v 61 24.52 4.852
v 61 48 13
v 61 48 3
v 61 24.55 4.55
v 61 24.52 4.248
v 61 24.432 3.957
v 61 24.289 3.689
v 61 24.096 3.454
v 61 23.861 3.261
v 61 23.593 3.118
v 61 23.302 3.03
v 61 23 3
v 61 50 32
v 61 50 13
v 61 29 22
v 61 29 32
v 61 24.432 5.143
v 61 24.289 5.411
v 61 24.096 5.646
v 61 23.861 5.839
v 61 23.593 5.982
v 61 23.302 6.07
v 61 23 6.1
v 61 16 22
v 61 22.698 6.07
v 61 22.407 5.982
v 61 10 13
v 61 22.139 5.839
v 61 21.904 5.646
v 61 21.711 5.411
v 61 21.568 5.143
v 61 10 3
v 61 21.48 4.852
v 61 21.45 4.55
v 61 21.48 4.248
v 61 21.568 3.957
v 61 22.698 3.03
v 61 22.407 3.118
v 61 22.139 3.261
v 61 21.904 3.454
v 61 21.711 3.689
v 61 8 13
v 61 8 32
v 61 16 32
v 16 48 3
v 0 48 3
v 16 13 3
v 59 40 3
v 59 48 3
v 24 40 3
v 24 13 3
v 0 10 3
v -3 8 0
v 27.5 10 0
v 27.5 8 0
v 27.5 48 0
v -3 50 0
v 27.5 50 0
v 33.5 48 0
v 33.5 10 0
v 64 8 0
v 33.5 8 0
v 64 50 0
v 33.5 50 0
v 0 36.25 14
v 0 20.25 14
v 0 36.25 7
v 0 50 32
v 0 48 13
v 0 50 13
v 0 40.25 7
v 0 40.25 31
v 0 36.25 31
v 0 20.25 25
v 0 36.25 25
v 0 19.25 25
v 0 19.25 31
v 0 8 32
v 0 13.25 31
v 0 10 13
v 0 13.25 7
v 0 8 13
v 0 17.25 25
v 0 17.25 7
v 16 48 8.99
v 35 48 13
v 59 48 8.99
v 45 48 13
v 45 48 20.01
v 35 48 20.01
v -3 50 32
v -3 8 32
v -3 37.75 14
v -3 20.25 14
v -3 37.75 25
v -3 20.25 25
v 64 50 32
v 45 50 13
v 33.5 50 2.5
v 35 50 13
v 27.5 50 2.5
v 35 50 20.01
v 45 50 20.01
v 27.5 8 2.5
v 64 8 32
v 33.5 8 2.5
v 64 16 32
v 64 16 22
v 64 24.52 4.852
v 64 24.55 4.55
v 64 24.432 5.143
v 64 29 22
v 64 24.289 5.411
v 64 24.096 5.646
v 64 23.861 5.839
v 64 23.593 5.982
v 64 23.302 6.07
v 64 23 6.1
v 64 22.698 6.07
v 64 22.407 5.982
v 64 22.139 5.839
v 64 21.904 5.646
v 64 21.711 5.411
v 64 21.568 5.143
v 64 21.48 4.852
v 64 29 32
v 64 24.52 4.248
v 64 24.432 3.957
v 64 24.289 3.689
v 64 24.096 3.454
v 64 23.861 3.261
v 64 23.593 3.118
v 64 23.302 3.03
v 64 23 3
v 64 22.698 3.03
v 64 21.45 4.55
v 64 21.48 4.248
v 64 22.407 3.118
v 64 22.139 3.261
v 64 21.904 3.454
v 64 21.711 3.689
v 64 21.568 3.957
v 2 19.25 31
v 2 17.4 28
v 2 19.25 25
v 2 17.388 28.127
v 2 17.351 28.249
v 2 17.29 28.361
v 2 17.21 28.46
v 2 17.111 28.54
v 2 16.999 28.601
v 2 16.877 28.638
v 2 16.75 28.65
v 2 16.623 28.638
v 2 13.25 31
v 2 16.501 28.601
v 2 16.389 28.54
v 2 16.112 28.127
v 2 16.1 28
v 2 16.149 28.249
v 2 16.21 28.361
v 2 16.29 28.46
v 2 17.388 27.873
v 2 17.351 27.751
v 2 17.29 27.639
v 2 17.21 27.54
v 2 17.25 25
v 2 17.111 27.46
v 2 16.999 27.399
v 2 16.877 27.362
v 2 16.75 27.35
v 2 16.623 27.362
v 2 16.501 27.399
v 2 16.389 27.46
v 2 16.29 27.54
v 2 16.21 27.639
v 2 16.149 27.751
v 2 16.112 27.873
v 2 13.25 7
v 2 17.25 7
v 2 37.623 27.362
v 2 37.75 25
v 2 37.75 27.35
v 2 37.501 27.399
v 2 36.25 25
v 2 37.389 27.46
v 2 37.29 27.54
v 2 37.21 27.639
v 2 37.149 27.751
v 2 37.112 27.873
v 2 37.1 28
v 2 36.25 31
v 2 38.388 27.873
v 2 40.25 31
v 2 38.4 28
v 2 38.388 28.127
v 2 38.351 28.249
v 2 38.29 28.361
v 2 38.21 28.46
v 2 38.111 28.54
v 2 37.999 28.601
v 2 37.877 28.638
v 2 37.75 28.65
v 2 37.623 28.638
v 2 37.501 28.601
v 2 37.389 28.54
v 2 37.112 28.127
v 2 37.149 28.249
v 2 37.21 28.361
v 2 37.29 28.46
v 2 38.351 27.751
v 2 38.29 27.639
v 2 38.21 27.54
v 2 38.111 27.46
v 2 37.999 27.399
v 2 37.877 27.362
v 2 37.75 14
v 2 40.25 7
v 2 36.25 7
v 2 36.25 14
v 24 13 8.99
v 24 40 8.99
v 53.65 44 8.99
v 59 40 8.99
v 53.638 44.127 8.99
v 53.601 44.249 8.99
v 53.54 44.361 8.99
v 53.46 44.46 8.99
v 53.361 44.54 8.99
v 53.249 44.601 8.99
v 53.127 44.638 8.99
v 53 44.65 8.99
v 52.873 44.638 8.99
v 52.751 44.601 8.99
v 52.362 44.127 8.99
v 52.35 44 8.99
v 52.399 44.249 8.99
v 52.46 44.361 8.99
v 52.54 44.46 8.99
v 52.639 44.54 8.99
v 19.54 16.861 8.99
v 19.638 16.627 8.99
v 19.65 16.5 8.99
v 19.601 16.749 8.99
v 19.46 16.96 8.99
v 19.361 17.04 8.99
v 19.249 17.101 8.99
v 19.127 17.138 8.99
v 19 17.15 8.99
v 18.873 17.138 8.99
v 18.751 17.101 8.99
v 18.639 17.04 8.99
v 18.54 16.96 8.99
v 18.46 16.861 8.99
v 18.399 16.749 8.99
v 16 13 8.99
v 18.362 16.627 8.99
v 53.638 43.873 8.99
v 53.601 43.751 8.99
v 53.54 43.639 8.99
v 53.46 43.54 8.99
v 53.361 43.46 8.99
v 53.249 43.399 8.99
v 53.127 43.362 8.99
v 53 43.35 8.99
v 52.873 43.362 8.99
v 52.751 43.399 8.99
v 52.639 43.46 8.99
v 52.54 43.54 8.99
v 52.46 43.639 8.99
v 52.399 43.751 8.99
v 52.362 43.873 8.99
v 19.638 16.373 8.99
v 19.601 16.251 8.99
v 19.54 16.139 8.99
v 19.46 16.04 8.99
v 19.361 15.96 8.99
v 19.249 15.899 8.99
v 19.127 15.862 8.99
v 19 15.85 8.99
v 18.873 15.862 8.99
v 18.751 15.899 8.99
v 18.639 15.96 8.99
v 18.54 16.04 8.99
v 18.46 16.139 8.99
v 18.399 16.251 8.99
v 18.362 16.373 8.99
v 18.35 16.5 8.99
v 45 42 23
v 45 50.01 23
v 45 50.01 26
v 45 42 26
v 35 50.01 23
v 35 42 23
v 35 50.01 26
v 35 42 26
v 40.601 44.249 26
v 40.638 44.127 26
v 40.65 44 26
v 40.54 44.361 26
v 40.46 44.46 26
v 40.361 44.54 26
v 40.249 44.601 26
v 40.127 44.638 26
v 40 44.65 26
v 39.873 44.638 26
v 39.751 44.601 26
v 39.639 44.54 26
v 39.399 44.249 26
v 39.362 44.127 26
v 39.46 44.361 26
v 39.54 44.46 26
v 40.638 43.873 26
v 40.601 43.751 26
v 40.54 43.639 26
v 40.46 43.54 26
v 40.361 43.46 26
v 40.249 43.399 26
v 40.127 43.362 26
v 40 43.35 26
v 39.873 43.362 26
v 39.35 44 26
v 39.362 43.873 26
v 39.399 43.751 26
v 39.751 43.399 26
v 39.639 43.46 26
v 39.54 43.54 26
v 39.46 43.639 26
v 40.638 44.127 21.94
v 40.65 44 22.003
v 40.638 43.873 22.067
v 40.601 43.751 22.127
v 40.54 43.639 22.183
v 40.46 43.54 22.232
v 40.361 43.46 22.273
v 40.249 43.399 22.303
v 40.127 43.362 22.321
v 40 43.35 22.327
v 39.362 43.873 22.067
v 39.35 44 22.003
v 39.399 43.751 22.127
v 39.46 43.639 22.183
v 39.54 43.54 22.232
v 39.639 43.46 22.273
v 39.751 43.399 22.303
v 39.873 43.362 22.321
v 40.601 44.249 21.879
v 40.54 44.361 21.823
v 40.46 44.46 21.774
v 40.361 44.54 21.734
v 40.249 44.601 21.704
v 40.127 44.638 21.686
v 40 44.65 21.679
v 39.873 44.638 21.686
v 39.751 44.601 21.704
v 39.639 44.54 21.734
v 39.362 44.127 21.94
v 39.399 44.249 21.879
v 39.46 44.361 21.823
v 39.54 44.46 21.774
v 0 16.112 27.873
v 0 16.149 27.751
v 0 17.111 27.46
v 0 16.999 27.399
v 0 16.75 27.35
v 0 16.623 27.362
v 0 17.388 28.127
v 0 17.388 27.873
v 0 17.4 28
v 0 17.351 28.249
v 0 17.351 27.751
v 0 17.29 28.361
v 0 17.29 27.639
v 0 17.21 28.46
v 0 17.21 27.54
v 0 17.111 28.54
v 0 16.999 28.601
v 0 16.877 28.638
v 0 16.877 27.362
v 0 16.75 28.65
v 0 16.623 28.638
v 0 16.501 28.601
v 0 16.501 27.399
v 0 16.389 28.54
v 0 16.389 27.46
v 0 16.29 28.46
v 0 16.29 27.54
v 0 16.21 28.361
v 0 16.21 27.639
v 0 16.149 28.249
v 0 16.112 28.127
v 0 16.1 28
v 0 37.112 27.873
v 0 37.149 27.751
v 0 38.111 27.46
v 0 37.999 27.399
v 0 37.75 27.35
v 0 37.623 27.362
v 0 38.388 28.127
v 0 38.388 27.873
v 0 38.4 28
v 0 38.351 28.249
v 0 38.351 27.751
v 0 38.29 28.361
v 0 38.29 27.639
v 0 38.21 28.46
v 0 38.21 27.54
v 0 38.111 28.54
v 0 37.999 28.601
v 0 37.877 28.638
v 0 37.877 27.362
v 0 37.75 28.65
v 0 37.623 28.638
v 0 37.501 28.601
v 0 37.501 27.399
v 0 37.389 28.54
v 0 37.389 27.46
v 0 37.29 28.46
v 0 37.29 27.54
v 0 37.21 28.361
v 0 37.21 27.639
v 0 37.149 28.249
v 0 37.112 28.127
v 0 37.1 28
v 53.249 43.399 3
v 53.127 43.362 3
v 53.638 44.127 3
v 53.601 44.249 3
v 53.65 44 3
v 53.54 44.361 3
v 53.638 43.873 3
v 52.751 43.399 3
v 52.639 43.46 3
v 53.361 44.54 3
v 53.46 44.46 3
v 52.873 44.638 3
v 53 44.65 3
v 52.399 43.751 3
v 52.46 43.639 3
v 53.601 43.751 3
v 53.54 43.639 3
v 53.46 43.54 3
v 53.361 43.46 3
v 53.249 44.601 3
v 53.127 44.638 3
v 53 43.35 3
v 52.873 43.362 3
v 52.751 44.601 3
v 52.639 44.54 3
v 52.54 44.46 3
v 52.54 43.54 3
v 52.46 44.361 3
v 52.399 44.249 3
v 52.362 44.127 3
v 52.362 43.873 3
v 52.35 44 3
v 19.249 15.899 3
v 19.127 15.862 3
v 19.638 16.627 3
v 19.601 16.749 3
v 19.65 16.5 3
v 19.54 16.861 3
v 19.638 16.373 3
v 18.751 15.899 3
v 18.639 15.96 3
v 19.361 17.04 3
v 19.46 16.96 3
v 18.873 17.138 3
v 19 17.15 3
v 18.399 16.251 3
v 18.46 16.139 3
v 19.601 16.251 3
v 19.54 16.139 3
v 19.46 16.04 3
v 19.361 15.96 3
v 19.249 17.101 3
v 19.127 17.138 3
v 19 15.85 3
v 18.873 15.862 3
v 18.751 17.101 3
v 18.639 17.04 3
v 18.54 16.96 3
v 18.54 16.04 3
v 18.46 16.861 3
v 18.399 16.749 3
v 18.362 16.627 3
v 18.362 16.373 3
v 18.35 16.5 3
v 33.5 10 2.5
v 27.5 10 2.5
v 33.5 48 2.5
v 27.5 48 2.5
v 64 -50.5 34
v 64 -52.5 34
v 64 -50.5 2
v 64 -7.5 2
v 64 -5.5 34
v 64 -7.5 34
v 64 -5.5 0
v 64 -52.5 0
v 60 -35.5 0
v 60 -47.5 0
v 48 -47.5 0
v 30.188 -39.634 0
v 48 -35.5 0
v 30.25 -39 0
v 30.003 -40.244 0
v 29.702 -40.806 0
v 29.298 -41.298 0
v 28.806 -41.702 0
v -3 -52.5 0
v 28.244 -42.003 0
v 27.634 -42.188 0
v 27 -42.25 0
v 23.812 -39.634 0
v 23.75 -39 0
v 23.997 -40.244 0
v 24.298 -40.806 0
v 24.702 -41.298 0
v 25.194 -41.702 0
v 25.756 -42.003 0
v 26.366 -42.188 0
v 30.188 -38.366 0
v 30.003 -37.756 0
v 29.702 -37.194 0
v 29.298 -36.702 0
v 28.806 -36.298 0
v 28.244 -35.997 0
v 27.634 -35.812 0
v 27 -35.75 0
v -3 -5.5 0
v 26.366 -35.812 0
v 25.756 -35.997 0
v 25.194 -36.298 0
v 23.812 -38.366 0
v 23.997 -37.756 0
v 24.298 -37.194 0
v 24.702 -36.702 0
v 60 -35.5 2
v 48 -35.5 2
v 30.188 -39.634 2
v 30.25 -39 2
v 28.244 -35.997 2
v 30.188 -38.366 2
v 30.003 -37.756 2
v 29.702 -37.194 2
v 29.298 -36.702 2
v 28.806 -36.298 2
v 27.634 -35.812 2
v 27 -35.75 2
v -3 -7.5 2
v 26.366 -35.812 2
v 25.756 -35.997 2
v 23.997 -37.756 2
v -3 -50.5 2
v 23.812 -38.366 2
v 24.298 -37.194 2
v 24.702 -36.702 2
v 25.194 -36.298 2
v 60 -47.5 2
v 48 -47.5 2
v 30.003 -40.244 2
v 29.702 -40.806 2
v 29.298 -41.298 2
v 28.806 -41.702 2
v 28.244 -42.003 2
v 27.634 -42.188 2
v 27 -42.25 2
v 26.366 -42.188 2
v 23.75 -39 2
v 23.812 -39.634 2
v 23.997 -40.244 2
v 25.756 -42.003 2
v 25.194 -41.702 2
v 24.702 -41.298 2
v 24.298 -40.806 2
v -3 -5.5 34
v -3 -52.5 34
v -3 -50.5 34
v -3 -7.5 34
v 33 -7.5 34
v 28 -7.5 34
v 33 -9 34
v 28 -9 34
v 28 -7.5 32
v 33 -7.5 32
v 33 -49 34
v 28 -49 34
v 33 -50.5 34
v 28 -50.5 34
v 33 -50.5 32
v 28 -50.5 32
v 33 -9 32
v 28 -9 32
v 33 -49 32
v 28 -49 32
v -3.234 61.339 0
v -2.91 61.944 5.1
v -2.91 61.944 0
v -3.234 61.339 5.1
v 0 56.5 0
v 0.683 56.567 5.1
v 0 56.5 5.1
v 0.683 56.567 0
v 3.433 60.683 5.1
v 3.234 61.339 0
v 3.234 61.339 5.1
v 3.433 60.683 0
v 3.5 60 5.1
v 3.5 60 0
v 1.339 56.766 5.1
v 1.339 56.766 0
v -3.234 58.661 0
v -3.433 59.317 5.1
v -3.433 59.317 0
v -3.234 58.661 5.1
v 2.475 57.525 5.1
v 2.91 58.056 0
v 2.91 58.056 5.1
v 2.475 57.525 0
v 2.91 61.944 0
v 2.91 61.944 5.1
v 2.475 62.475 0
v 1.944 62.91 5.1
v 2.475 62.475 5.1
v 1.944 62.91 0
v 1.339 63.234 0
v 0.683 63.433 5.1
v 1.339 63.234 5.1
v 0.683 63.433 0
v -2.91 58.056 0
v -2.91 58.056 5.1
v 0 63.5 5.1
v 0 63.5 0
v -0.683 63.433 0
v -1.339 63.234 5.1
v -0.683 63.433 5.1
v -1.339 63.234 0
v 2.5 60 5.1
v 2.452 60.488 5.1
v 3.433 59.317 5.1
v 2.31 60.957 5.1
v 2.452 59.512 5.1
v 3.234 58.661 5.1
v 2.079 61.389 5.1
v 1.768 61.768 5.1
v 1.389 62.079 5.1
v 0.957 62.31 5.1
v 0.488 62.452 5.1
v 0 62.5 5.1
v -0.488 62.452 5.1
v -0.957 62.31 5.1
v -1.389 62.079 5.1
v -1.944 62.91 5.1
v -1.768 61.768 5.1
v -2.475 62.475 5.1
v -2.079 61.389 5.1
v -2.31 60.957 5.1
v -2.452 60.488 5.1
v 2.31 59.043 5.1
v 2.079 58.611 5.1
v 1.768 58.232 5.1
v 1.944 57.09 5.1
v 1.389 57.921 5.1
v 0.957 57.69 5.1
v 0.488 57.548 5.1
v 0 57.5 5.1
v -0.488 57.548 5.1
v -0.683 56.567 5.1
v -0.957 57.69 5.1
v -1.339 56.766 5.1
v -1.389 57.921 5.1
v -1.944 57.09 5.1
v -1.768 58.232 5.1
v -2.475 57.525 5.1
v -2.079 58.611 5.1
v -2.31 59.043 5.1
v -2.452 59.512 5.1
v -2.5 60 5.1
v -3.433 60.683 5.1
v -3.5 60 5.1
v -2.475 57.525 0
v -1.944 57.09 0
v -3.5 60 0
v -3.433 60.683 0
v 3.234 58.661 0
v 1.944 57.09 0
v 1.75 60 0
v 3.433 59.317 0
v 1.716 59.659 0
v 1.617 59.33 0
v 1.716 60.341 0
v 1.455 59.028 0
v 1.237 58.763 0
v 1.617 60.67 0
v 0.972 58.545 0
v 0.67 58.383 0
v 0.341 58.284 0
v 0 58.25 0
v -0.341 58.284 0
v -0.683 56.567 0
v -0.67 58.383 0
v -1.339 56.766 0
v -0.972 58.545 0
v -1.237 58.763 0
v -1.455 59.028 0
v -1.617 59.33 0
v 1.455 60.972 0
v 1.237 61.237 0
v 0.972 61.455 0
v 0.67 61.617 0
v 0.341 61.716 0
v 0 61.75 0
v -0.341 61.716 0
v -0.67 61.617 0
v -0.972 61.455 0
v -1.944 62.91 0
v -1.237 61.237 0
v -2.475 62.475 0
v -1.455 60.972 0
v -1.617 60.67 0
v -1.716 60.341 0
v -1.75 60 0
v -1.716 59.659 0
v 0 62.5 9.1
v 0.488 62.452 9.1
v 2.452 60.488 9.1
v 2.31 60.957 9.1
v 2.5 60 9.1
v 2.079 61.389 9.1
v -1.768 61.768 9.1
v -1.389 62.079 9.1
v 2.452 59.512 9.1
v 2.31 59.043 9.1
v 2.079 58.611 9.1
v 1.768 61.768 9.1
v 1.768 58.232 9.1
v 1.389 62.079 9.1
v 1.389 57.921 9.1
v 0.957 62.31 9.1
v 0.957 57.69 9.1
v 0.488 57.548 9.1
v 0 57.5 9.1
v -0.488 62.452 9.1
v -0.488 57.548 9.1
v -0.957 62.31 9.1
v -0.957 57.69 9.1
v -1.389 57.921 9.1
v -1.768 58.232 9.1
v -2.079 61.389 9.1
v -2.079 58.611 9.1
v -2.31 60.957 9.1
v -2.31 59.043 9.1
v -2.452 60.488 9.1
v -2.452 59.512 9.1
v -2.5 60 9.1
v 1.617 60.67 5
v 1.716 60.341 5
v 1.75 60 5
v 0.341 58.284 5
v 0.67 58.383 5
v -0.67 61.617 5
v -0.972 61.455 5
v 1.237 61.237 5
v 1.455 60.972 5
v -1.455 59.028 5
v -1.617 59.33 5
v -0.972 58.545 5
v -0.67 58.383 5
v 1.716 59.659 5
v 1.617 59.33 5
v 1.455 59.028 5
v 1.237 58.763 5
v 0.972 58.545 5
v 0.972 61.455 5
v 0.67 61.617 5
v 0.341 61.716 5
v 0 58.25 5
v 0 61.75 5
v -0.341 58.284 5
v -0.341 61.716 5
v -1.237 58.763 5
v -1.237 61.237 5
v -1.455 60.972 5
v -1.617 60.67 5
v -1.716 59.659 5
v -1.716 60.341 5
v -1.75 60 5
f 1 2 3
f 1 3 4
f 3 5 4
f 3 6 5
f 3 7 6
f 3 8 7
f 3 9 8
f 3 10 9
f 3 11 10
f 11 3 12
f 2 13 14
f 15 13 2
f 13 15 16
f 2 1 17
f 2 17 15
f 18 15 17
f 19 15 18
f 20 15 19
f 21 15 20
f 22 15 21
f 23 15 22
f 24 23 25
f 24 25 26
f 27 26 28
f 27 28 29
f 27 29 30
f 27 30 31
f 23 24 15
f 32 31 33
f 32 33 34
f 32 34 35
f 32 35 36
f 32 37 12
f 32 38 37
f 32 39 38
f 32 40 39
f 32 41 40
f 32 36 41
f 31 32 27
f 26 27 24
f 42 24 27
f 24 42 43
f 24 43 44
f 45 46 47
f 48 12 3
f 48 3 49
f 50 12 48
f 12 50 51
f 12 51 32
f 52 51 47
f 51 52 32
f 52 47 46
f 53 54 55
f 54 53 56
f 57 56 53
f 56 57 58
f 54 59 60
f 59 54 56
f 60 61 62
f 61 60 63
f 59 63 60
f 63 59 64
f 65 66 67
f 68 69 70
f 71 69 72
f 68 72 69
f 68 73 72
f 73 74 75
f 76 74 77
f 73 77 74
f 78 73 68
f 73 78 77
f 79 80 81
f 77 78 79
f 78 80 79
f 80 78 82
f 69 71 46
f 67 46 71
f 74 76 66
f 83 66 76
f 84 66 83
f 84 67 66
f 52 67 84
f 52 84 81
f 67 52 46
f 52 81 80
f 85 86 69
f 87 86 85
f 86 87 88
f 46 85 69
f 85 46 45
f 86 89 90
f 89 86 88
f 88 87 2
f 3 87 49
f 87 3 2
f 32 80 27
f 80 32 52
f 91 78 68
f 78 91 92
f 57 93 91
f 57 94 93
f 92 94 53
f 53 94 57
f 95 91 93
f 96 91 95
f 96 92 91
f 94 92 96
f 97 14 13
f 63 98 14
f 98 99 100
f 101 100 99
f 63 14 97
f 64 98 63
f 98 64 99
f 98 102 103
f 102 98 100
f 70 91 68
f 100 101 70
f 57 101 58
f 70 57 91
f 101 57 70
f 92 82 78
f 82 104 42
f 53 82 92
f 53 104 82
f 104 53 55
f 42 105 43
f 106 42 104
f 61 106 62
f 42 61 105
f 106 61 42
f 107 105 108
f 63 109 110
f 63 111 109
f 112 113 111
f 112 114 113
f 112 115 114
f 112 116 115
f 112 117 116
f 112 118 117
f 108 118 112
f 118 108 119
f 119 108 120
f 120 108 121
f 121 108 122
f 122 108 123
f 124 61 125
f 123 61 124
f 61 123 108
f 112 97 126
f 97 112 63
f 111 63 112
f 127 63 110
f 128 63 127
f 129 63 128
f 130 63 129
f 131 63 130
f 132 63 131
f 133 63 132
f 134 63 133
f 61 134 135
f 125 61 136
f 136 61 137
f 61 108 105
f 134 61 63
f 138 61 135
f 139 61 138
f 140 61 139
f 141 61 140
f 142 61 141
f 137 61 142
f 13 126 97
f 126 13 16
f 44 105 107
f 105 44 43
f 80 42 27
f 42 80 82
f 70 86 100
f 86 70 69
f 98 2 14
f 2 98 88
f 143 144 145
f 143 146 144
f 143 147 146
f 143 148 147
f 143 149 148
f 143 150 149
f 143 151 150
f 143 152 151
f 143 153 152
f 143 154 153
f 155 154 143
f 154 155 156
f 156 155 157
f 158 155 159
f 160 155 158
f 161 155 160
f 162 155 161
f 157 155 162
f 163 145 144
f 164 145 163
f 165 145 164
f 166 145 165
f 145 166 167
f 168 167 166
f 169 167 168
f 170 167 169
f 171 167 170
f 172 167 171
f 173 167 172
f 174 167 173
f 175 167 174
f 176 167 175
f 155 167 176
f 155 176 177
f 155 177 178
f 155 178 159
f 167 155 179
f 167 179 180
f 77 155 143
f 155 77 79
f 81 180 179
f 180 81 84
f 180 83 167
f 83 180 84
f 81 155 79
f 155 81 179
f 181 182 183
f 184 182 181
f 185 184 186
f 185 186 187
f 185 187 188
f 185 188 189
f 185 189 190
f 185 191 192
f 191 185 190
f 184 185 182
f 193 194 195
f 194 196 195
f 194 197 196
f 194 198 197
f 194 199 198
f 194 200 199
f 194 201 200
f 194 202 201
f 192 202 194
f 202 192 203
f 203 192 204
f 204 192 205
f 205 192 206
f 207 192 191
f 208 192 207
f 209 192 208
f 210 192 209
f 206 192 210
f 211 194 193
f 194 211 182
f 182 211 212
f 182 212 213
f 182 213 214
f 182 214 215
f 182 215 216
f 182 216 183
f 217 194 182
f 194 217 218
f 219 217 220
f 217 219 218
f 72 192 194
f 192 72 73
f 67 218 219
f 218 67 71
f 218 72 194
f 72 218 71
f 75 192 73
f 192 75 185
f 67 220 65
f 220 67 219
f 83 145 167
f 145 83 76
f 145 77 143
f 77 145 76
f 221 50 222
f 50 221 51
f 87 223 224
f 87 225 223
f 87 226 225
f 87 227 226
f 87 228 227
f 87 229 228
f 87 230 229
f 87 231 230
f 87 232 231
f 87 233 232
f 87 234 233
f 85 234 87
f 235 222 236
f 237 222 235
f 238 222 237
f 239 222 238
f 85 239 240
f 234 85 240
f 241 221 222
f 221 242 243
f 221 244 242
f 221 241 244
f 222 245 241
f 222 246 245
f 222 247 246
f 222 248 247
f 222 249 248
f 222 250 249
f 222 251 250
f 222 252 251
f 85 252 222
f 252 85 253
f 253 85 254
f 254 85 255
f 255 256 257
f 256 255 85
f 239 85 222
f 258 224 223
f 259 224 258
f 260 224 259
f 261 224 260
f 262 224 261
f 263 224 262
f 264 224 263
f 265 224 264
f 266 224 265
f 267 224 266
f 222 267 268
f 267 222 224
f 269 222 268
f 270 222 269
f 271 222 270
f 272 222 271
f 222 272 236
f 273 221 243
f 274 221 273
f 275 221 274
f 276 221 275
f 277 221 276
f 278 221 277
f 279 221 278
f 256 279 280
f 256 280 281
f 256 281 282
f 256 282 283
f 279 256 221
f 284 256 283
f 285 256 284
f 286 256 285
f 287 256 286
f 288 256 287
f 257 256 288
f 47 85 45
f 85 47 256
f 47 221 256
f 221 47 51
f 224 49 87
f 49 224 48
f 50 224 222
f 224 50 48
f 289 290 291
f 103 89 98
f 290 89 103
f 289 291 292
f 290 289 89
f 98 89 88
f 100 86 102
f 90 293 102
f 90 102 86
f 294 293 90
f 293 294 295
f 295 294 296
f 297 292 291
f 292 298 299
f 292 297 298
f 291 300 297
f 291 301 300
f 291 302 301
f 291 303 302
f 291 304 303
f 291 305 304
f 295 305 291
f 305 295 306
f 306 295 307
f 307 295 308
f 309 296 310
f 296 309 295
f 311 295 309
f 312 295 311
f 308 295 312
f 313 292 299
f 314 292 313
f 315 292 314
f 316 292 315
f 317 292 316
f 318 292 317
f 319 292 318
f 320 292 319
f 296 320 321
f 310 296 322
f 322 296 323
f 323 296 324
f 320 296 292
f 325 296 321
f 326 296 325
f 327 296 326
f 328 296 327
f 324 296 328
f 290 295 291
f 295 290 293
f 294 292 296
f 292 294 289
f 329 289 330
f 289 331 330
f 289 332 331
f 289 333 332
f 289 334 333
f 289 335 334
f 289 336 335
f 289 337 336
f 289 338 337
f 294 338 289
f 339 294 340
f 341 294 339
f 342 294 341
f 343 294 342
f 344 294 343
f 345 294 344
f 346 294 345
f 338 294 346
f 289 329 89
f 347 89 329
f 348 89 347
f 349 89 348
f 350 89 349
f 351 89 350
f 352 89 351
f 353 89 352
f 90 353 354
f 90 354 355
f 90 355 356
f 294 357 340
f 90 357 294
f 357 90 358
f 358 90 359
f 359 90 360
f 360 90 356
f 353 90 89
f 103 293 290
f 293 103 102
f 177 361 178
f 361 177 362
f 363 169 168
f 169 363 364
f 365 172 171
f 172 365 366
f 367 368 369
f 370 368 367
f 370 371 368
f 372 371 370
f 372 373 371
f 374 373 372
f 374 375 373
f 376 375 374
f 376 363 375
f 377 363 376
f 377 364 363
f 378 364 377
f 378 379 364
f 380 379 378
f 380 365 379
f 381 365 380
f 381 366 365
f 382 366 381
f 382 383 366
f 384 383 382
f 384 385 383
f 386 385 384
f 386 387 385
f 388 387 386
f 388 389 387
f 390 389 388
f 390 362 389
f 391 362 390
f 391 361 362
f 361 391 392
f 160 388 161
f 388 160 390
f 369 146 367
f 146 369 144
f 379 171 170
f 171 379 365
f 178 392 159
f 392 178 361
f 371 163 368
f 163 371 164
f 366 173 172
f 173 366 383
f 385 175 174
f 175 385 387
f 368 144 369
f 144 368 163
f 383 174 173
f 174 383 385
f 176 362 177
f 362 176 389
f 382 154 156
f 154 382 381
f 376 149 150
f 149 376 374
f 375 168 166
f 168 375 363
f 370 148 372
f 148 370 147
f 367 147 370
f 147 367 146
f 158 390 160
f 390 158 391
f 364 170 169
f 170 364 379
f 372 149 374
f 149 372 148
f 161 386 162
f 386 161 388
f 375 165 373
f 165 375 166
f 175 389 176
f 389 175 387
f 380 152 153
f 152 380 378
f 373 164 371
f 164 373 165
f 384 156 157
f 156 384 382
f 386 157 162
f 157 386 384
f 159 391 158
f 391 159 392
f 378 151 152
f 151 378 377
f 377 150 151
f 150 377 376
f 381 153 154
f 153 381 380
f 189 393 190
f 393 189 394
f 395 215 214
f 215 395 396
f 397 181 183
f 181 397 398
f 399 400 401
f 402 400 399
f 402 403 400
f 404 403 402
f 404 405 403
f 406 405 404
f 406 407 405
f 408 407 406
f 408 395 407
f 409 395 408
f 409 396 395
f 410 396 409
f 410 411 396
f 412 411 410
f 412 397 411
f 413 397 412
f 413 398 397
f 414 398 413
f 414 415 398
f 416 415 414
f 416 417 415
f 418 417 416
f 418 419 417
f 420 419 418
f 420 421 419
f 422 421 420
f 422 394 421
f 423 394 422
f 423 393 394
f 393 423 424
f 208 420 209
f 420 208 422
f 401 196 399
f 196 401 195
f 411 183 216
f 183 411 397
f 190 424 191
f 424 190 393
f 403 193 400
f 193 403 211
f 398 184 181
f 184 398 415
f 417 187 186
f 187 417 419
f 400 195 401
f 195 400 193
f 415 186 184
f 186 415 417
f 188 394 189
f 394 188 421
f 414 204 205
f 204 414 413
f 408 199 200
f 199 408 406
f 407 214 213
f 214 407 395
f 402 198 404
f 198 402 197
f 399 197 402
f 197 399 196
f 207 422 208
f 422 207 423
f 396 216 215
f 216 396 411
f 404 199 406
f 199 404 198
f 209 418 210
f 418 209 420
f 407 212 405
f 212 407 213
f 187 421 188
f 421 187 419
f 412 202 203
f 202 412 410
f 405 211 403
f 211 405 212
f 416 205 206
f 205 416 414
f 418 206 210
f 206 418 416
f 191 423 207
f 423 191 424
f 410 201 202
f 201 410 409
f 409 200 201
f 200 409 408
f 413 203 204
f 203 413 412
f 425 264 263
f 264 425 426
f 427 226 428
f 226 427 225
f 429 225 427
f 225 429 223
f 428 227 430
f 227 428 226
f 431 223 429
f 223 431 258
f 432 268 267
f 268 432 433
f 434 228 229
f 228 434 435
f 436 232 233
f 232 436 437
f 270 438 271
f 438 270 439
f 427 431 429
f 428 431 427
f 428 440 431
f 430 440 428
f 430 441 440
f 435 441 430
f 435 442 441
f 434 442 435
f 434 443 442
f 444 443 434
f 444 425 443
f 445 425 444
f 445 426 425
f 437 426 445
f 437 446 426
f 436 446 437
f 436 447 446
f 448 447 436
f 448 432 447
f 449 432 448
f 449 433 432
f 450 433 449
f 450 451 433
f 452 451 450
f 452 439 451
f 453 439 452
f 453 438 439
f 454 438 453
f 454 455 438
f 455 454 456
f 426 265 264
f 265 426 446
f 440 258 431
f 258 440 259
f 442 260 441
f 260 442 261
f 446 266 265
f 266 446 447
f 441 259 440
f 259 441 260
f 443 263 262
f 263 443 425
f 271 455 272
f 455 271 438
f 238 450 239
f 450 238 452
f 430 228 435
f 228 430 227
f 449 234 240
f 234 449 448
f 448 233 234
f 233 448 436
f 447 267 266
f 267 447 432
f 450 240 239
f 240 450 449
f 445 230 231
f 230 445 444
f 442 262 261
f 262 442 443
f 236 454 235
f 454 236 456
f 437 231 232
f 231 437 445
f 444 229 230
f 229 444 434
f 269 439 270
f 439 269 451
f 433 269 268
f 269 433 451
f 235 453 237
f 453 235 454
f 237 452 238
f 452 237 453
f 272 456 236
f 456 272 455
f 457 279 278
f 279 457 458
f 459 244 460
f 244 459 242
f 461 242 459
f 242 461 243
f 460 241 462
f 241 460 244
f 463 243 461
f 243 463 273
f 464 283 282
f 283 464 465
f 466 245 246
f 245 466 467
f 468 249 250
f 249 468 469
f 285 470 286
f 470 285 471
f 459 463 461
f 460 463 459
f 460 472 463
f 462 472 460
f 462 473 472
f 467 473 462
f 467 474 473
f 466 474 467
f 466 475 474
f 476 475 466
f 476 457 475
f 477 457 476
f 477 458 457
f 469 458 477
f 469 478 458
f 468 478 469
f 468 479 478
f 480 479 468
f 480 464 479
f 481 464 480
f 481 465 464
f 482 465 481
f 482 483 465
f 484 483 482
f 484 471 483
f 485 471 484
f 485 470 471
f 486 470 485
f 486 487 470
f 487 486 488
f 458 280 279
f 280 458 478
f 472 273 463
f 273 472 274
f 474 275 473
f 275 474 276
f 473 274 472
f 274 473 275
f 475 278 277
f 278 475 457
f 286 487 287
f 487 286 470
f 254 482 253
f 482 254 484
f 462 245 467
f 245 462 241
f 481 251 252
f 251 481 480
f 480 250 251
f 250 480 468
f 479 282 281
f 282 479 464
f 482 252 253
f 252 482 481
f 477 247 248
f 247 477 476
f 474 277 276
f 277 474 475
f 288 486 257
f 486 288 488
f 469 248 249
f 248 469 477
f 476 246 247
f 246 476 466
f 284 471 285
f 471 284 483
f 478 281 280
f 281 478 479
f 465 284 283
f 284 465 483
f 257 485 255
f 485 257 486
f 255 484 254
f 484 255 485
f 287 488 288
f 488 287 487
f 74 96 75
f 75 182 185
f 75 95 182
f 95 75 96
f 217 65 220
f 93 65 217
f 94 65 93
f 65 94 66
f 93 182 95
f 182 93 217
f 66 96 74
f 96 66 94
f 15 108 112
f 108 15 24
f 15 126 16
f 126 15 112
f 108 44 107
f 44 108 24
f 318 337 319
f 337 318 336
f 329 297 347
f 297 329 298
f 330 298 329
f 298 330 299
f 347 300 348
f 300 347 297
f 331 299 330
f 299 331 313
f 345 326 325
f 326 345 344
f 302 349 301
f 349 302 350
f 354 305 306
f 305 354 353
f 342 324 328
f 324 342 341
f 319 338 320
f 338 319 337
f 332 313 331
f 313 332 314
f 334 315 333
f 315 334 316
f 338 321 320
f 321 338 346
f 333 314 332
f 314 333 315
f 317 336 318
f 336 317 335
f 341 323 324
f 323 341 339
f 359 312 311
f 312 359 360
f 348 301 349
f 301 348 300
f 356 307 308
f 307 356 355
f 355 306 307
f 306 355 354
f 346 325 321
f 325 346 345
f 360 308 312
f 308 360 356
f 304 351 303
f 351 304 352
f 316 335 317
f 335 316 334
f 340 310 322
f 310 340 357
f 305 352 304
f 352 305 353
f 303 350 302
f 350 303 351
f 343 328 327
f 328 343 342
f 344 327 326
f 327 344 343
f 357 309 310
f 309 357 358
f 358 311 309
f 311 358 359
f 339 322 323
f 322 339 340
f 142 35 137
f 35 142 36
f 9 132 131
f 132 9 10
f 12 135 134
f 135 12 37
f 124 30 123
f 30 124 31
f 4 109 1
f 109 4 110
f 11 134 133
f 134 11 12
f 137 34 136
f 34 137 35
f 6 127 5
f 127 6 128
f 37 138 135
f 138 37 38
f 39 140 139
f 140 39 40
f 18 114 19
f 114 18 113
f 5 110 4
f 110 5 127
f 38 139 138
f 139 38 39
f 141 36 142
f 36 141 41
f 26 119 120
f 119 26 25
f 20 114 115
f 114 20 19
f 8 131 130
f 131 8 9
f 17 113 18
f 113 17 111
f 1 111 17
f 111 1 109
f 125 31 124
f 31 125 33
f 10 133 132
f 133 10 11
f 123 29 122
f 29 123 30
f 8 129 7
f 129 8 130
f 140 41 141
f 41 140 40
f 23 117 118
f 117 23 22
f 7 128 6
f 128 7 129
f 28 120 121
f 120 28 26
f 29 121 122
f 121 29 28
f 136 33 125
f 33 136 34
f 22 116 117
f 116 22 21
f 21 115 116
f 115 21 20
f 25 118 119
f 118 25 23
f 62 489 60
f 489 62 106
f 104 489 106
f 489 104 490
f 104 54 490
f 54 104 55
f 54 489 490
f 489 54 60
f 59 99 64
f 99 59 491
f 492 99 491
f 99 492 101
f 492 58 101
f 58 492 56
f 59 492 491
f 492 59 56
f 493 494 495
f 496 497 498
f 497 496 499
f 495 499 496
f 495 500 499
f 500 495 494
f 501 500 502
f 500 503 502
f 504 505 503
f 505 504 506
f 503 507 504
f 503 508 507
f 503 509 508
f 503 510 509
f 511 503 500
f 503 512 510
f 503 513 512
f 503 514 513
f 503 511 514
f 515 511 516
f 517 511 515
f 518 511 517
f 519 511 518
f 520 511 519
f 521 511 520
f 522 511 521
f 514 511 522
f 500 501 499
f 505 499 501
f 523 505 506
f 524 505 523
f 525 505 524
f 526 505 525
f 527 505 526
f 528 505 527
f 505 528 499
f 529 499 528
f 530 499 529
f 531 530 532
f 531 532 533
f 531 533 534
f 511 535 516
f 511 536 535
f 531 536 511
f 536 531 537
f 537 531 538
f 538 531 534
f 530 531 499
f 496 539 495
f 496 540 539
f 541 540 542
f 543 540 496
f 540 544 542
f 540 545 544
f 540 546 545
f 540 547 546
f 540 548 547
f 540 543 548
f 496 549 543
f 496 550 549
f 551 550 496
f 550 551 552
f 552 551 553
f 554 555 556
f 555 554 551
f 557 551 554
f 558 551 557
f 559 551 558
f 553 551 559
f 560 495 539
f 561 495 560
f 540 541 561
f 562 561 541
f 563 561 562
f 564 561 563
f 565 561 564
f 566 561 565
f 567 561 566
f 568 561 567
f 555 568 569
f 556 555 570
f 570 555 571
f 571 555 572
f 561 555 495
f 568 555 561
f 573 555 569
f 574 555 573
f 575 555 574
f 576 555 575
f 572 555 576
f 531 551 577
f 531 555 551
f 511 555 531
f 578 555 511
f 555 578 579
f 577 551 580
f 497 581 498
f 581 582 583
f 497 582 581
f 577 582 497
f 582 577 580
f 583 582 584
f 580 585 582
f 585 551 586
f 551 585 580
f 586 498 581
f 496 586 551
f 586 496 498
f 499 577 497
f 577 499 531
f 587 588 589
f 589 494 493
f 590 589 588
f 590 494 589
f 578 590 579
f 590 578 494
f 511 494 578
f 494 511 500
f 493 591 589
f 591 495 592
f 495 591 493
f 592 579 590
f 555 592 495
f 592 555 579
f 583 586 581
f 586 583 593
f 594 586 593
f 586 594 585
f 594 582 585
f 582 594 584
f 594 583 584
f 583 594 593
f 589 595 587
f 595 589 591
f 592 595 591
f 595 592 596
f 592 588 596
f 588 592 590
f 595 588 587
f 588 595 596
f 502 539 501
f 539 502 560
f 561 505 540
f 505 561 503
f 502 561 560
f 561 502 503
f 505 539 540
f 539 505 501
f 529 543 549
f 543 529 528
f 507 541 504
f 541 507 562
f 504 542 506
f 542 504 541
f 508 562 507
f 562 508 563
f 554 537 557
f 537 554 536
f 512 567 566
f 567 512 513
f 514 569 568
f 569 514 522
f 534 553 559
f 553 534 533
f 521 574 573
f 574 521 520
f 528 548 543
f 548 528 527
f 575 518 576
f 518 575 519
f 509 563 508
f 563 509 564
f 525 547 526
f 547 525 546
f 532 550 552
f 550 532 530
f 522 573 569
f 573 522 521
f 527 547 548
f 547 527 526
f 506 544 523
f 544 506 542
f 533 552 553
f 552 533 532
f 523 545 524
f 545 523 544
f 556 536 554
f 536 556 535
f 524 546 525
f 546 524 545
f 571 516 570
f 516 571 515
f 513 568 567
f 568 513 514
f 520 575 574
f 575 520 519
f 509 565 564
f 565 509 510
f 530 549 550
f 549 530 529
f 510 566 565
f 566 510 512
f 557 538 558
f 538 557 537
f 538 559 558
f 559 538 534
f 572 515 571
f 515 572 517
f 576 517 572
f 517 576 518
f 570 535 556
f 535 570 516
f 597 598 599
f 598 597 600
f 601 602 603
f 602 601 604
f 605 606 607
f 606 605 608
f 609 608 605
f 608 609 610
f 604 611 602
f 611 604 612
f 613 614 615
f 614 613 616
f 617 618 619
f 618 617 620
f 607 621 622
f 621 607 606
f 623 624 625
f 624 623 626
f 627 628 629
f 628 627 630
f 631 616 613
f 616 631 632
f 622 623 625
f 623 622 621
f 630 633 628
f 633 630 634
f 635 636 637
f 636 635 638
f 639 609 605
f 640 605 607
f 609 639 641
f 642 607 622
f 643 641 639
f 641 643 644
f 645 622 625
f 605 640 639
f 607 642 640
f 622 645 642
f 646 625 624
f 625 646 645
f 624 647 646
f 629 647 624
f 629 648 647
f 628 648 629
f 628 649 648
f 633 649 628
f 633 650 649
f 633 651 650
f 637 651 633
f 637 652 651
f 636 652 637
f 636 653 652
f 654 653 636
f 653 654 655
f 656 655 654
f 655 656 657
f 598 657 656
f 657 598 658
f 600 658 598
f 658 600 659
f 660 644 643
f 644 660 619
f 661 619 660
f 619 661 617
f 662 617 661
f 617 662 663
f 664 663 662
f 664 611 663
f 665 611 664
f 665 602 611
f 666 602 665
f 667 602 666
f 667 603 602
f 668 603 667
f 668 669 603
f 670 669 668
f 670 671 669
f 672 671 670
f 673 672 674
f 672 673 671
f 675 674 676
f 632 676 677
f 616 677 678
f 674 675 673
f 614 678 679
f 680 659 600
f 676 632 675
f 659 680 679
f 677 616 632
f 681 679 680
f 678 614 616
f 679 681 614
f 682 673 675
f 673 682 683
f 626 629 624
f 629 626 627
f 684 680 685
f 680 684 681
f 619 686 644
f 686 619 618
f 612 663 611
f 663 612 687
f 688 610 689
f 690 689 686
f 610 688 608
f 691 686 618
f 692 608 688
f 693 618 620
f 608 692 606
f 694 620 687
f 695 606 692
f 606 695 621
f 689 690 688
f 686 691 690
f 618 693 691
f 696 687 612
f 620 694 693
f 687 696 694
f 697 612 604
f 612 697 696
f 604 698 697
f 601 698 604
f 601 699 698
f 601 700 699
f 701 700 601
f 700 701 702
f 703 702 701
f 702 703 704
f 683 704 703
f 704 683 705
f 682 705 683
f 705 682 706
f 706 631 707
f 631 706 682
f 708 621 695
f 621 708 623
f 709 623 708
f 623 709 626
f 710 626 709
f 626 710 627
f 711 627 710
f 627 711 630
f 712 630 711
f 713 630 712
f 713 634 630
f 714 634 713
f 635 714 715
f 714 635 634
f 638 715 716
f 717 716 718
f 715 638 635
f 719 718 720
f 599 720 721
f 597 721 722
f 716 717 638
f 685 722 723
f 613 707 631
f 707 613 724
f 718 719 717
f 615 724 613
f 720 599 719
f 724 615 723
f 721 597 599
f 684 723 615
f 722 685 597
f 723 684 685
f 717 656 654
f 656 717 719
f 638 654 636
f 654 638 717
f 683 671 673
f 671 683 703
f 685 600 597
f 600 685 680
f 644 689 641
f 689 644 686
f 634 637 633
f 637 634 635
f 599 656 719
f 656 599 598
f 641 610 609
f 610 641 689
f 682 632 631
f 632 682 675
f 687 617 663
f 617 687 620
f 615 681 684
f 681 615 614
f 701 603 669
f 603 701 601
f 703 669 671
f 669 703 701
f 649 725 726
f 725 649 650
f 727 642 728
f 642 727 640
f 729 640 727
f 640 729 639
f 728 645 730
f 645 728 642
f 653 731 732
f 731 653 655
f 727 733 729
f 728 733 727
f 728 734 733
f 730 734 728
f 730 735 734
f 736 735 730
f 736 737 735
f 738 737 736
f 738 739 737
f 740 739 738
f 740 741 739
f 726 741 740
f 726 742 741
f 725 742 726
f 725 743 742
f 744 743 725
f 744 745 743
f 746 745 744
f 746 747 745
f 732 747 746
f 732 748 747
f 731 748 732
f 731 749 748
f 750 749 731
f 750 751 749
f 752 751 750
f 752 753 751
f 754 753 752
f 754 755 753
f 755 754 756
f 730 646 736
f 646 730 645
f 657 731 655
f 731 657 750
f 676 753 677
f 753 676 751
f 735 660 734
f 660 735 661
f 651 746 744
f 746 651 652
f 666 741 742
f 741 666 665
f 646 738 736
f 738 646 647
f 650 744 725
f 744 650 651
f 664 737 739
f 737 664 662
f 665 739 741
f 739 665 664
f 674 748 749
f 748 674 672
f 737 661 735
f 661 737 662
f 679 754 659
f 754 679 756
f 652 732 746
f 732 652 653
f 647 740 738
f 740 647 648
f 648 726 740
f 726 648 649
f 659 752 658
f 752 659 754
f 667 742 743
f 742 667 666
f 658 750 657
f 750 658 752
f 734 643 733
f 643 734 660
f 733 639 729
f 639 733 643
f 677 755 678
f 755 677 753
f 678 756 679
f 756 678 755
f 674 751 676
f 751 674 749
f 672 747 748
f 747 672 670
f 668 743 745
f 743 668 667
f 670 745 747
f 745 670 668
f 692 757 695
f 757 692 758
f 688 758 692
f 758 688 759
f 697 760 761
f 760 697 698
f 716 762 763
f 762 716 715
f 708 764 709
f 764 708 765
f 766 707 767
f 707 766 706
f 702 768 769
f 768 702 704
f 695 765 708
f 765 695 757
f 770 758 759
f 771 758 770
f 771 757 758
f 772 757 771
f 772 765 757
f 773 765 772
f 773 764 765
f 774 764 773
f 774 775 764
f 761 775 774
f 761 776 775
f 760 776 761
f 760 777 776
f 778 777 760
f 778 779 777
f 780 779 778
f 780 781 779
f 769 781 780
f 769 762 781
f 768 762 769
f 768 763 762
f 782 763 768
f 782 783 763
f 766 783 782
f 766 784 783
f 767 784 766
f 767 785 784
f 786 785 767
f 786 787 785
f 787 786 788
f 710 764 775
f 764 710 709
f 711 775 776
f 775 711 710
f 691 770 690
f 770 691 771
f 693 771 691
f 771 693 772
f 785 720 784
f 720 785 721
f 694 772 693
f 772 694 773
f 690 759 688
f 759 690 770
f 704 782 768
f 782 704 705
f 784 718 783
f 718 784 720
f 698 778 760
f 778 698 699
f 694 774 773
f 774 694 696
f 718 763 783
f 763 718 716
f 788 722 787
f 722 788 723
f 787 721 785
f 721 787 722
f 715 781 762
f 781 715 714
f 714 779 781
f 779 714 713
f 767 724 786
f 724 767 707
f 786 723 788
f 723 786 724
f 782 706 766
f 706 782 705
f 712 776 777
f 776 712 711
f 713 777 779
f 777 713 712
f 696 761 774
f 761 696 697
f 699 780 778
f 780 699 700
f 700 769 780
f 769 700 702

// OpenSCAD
/*
* Open3DOLED is licensed under CC BY-NC-SA 4.0. To view a copy of this license, visit http://creativecommons.org/licenses/by-nc-sa/4.0/
*/

/*
*
* 3D DLPLink Relay Case
*
* Version 0203a: support for dlplink opt101 board
* Version 0201a: support for din3 to ir relay
* Version 0101a: support for rf to ir relay
* Todo:
*  - 
* 
* Notes:
*  - 
*
*/

/* [Hidden:] */

$fn = 32;
ovr = 0.01;
big = 10;

bevel_d = 1.0;

mb_base_d = 2.5; // depth (needs to provide clearance for m1.4 4mm screws minus pcb depth)
main_pcb_wh = 20.0; // components and pcb // measured 17.6
mc_usbh_pz = 15;

main_pcb_px = 3;
base_wx = 61;
base_wy = 38;
base_wz = 3;
base_ww = 2; // wall width
base_wh = 10; // wall height
base_fww = 3; // front wall width
base_fwh = 29; // front wall height
base_bww = base_fww; // back wall width
base_bwh = base_fwh; // back wall height
rows_of_leds_populated = 2;
base_irh_wy = 17.5; // ir hole
base_irh_wz = (rows_of_leds_populated == 2 ? 11 : (rows_of_leds_populated == 1 ? 5 : 0));
base_irh_py = (base_wy - base_irh_wy) / 2;
base_irh_pz = 5;
base_irs_py = base_irh_py - 6; // 2.5 or 6 depending on side
base_irs_pz = base_irh_pz - 7;
base_irm_wx = 2; // ir mount
base_irm12_wy = 4;
base_irm12_wz = 24;
base_irm3_wy = 6;
base_irm3_wz = 6;
base_irm13_py = base_irs_py + 3 - base_irm12_wy;
base_irm2_py = base_irs_py + 26 - 4;
base_irm12_pz = base_irs_pz;
base_irm3_pz = base_irs_pz + 24 - base_irm3_wz;
base_usbh_wy = 13; // usb hole
base_usbh_wz = main_pcb_wh+mb_base_d-mc_usbh_pz+4;
base_usbh_py = 6;
base_usbh_pz = 13;
base_mbm_wz = 6; // main board mount
base_mbm1_wx = 8;
base_mbm1_wy = 37;
base_mbm1_px = 13+main_pcb_px;
base_mbm1_py = 3;
base_mbm2_wx = 43;
base_mbm2_wy = 10;
base_mbm2_px = base_mbm1_px;
base_mbm2_py = base_mbm1_py+base_mbm1_wy-base_mbm2_wy;
base_obm_px = 35;
base_obm_wx = 10;
base_obm_pdz = 6;
base_obma_wz = 3;
base_obma_wy = 8;
base_obmr_pdz = 3;

m1_4_wd_h_st = 1.3; // m1.4 self threading hole diameter
base_smh_list = [[2.5,21],[23.5,21]]; // y, z
main_pcb_wx = 37.5;
main_pcb_wy = 50;
main_pcb_py = 3.5;
base_mmh_list = [[34,main_pcb_wy-3.5+main_pcb_py+main_pcb_px],[6.5,main_pcb_wy-37.5+main_pcb_py+main_pcb_px]]; // y, x

base_obmmh_px = base_obm_px+base_obm_wx/2;
base_obmmh_py = base_mmh_list[0][0];
base_obmh_wx = 12;
base_obmh_wy = 12;
base_obmh_px = base_obmmh_px+8;
base_obmh_py = base_obmmh_py-base_obmh_wy+3.5;
base_md3d_wd_h = 3.1;
base_md3d_py = 13;

cover_ww = 2;
cover_tol = 0.5;
cover_tab_wx = 5;
cover_tab_wy = 1.5;
cover_tab_wz = 2;
cover_esb_wd = 5;
cover_esbh_wd = cover_esb_wd+1.5;
cover_esbh_px = 27;
cover_esbh_py = base_wy-9;
cover_esbhi_wd = 3.5;
cover_esbo_wd = cover_esb_wd+2; // diameter of portion under case with lip to stop button falling out
cover_esbhi_wz = 5; // height of walls that surround inside button
cover_esbs_wz = 0.1; // height difference between top of inside and outside button
cover_esbt_wz = cover_ww+2; // height of top of button

module base() {
  difference() {
    union() {
      cube([base_wx,base_wy,base_wz]); // base
      translate([-base_fww,-base_ww,0])cube([base_fww,base_wy+2*base_ww,base_fwh+base_wz]); // front
      translate([base_wx,-base_ww,0])cube([base_bww,base_wy+2*base_ww,base_bwh+base_wz]); // back
      translate([-base_fww,-base_ww,0])cube([base_wx+base_ww+base_fww,base_ww,base_wh+base_wz]); // right
      translate([-base_fww,base_wy,0])cube([base_wx+base_ww+base_fww,base_ww,base_wh+base_wz]); // left
      translate([-ovr,base_irm13_py,base_irm12_pz+base_wz+base_mbm_wz])cube([base_irm_wx+ovr,base_irm12_wy,base_irm12_wz]); // ir mount 1
      translate([-ovr,base_irm2_py,base_irm12_pz+base_wz+base_mbm_wz])cube([base_irm_wx+ovr,base_irm12_wy,base_irm12_wz]); // ir mount 2
      translate([-ovr,base_irm13_py,base_irm3_pz+base_wz+base_mbm_wz])cube([base_irm_wx+ovr,base_irm3_wy,base_irm3_wz]); // ir mount 3
      translate([base_mbm1_px,base_mbm1_py,base_wz-ovr])cube([base_mbm1_wx,base_mbm1_wy,base_mbm_wz]);  // main board mount
      translate([base_mbm2_px,base_mbm2_py,base_wz-ovr])cube([base_mbm2_wx,base_mbm2_wy,base_mbm_wz]);  // main board mount
      translate([base_obm_px,base_wy,0])cube([base_obm_wx,base_ww,base_bwh+base_wz-base_obm_pdz-base_obma_wz+ovr]); // opt board mount tower
      translate([base_obm_px,base_wy+base_ww-base_obma_wy,base_bwh+base_wz-base_obm_pdz-base_obma_wz])cube([base_obm_wx,base_obma_wy+ovr,base_obma_wz]);
 // opt board mount arm
      // opt board mount ramp
      hull() {
        translate([base_obm_px,base_wy,base_bwh+base_wz-base_obm_pdz-base_obmr_pdz-base_obma_wz+ovr])cube([base_obm_wx,base_ww,ovr]);
        translate([base_obm_px,base_wy+base_ww-base_obma_wy,base_bwh+base_wz-base_obm_pdz-base_obma_wz])cube([base_obm_wx,base_obma_wy+ovr,ovr]); 
      }
       
    }
    union() {
      translate([-base_fww-ovr,base_irh_py,base_irh_pz+base_wz+base_mbm_wz])cube([base_fww+base_irm_wx+2*ovr,base_irh_wy,base_irh_wz]);
      translate([base_wx-ovr,base_usbh_py,base_usbh_pz+base_wz+base_mbm_wz])cube([base_bww+2*ovr,base_usbh_wy,base_usbh_wz]);
      
      for (ss=base_smh_list) {
        translate([0,base_irs_py+ss[0],base_irs_pz+base_wz+base_mbm_wz+ss[1]])rotate([0,90,0])cylinder(h=base_irm_wx+ovr,d=m1_4_wd_h_st);
      }
      
      for (ss=base_mmh_list) {
        translate([ss[1],ss[0],base_wz])cylinder(h=10+base_mbm_wz+ovr,d=m1_4_wd_h_st);
      }
      
      translate([base_obmmh_px,base_obmmh_py,base_bwh+base_wz-base_obm_pdz-base_obmr_pdz-base_obma_wz-ovr])cylinder(h=base_obm_pdz+base_obmr_pdz+2*ovr,d=m1_4_wd_h_st); // opt board mount screw hole
      translate([base_wx-ovr,base_md3d_py,base_wz+base_md3d_wd_h/2])rotate([0,90,0])cylinder(h=base_bww+2*ovr,d=base_md3d_wd_h);// minidin 3d sync out cable hole
      
      translate([base_wx/2-cover_tab_wx/2-cover_tol,-base_ww-ovr,-ovr])cube([cover_tab_wx+2*cover_tol,cover_tab_wy+cover_tol+ovr,cover_tab_wz+cover_tol+ovr]); // right lock tab
      translate([base_wx/2-cover_tab_wx/2-cover_tol,base_wy+base_ww-cover_tab_wy-cover_tol,-ovr])cube([cover_tab_wx+2*cover_tol,cover_tab_wy+cover_tol+ovr,cover_tab_wz+cover_tol+ovr]); // left lock tab
    }
  }
}

module cover() {
  difference() {
    union() {
      translate([-base_fww,-base_ww-cover_tol-ovr,base_wz+base_fwh])cube([base_wx+base_bww+base_fww,base_wy+2*base_ww+2*cover_tol+2*ovr,cover_ww]); // top
      translate([-base_fww,-base_ww-cover_ww-cover_tol,0])cube([base_wx+base_bww+base_fww,cover_ww,base_wz+base_fwh+cover_ww]); // right
      translate([-base_fww,base_wy+base_ww+cover_tol,0])cube([base_wx+base_bww+base_fww,cover_ww,base_wz+base_fwh+cover_ww]); // left
      translate([base_wx/2-cover_tab_wx/2,-base_ww-cover_tol,0])cube([cover_tab_wx,cover_tab_wy,cover_tab_wz]); // right lock tab
      translate([base_wx/2-cover_tab_wx/2,base_wy+base_ww+cover_tol-cover_tab_wy,0])cube([cover_tab_wx,cover_tab_wy,cover_tab_wz]); // left lock tab
    }
    union() {
      translate([base_obmh_px,base_obmh_py,base_wz+base_fwh-ovr])cube([base_obmh_wx,base_obmh_wy,cover_ww+2*ovr]); // hole for dlplink optical sensor in case top, comment this line out if you don't need it
      translate([cover_esbh_px,cover_esbh_py,base_wz+base_fwh-ovr])cylinder(h=cover_ww+2*ovr,d=cover_esbh_wd); // hole for eye swap button on switch 4 in case top, comment this line out if you don't need it
    }
  }
}

// SMD Switch used is 6x6x19 4Pin Tactile Tact Push Button Micro Switch Self-reset Switch
// https://www.aliexpress.com/item/1005005845072975.html
module button() {
  difference() {  
    union() {
      cylinder(h=cover_esbhi_wz+cover_esbs_wz,d=cover_esbo_wd); // button base
      translate([0,0,cover_esbhi_wz+cover_esbs_wz-ovr])cylinder(h=cover_esbt_wz+ovr,d=cover_esb_wd); // button top
    }
    union() {
      translate([0,0,-ovr])cylinder(h=cover_esbhi_wz+ovr,d=cover_esbhi_wd); // inside pocket for sitting on button
    }
  }
}

translate([0,10,0])
base();
translate([0,-10,base_wz+base_fwh+cover_ww])
rotate([180,0,0])
cover();
translate([0,60,0])
button();
